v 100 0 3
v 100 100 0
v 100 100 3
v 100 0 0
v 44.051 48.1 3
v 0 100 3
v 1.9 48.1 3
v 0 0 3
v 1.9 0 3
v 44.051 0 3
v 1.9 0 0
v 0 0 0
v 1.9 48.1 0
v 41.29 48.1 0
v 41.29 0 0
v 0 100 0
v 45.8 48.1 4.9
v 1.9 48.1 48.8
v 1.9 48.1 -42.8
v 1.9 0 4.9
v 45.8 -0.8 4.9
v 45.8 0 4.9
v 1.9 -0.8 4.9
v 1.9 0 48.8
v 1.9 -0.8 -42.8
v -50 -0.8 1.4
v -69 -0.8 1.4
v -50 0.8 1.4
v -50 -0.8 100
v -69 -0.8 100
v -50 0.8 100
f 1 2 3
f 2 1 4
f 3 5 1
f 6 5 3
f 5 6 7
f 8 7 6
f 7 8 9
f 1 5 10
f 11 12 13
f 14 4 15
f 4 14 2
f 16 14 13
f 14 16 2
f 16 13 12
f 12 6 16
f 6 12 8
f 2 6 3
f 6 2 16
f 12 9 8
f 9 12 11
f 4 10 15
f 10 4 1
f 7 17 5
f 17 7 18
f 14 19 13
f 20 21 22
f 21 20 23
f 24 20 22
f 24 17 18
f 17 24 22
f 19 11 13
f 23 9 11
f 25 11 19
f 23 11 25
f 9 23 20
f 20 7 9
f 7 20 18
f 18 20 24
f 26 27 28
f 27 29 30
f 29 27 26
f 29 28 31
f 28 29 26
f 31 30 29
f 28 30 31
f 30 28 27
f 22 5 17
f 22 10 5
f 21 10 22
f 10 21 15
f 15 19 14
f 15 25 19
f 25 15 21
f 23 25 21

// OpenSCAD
$fn = 32;
// ----------------------------------------------------------------------
// Freeform cube: 100 x 100 x 100 mm, 10 mm thick
// ----------------------------------------------------------------------
// --- parameters (mm) ---
base_len = 100;           // base length
base_w = 100;             // base width
base_h = 100;             // base height
plate_t = 3;              // plate thickness
hole_d = 6.6;             // clearance for M6
slot_w = 1.6;             // adjustment slot width
slot_l = 19;              // adjustment slot length
rib_leg = 45.8;           // gusset leg
rib_sink = 1.9;           // gusset overlap into the plates
module base_extrude() {
  cube([base_len, base_w, plate_t]);
}
module gusset() {
  translate([0, base_w / 2 - rib_sink, plate_t])
    rotate([90, 0, 0])
      linear_extrude(height = base_w / 2 - rib_sink)
        polygon(points = [[rib_sink, rib_sink], [rib_leg, rib_sink], [rib_sink, rib_leg]]);
}
module adjustment_slots() {
  translate([-base_len / 2 - slot_l / 2, 0, plate_t - slot_w])
    linear_extrude(height = base_h - plate_t + slot_w)
      polygon(points = [[slot_l / 2, -slot_w / 2], [slot_l / 2, slot_w / 2], [-slot_l / 2, -slot_w / 2]]);
}
module gusset_adjustment() {
  translate([0, base_w / 2 - rib_sink, plate_t])
    rotate([90, 0, 0])
      linear_extrude(height = base_w / 2 - plate_t + rib_sink)
        polygon(points = [[rib_sink, rib_sink], [rib_leg, rib_sink], [rib_sink, -rib_leg]]);
}
difference() {
  union() {
    base_extrude();
    gusset();
    adjustment_slots();
    gusset_adjustment();
  }
}
